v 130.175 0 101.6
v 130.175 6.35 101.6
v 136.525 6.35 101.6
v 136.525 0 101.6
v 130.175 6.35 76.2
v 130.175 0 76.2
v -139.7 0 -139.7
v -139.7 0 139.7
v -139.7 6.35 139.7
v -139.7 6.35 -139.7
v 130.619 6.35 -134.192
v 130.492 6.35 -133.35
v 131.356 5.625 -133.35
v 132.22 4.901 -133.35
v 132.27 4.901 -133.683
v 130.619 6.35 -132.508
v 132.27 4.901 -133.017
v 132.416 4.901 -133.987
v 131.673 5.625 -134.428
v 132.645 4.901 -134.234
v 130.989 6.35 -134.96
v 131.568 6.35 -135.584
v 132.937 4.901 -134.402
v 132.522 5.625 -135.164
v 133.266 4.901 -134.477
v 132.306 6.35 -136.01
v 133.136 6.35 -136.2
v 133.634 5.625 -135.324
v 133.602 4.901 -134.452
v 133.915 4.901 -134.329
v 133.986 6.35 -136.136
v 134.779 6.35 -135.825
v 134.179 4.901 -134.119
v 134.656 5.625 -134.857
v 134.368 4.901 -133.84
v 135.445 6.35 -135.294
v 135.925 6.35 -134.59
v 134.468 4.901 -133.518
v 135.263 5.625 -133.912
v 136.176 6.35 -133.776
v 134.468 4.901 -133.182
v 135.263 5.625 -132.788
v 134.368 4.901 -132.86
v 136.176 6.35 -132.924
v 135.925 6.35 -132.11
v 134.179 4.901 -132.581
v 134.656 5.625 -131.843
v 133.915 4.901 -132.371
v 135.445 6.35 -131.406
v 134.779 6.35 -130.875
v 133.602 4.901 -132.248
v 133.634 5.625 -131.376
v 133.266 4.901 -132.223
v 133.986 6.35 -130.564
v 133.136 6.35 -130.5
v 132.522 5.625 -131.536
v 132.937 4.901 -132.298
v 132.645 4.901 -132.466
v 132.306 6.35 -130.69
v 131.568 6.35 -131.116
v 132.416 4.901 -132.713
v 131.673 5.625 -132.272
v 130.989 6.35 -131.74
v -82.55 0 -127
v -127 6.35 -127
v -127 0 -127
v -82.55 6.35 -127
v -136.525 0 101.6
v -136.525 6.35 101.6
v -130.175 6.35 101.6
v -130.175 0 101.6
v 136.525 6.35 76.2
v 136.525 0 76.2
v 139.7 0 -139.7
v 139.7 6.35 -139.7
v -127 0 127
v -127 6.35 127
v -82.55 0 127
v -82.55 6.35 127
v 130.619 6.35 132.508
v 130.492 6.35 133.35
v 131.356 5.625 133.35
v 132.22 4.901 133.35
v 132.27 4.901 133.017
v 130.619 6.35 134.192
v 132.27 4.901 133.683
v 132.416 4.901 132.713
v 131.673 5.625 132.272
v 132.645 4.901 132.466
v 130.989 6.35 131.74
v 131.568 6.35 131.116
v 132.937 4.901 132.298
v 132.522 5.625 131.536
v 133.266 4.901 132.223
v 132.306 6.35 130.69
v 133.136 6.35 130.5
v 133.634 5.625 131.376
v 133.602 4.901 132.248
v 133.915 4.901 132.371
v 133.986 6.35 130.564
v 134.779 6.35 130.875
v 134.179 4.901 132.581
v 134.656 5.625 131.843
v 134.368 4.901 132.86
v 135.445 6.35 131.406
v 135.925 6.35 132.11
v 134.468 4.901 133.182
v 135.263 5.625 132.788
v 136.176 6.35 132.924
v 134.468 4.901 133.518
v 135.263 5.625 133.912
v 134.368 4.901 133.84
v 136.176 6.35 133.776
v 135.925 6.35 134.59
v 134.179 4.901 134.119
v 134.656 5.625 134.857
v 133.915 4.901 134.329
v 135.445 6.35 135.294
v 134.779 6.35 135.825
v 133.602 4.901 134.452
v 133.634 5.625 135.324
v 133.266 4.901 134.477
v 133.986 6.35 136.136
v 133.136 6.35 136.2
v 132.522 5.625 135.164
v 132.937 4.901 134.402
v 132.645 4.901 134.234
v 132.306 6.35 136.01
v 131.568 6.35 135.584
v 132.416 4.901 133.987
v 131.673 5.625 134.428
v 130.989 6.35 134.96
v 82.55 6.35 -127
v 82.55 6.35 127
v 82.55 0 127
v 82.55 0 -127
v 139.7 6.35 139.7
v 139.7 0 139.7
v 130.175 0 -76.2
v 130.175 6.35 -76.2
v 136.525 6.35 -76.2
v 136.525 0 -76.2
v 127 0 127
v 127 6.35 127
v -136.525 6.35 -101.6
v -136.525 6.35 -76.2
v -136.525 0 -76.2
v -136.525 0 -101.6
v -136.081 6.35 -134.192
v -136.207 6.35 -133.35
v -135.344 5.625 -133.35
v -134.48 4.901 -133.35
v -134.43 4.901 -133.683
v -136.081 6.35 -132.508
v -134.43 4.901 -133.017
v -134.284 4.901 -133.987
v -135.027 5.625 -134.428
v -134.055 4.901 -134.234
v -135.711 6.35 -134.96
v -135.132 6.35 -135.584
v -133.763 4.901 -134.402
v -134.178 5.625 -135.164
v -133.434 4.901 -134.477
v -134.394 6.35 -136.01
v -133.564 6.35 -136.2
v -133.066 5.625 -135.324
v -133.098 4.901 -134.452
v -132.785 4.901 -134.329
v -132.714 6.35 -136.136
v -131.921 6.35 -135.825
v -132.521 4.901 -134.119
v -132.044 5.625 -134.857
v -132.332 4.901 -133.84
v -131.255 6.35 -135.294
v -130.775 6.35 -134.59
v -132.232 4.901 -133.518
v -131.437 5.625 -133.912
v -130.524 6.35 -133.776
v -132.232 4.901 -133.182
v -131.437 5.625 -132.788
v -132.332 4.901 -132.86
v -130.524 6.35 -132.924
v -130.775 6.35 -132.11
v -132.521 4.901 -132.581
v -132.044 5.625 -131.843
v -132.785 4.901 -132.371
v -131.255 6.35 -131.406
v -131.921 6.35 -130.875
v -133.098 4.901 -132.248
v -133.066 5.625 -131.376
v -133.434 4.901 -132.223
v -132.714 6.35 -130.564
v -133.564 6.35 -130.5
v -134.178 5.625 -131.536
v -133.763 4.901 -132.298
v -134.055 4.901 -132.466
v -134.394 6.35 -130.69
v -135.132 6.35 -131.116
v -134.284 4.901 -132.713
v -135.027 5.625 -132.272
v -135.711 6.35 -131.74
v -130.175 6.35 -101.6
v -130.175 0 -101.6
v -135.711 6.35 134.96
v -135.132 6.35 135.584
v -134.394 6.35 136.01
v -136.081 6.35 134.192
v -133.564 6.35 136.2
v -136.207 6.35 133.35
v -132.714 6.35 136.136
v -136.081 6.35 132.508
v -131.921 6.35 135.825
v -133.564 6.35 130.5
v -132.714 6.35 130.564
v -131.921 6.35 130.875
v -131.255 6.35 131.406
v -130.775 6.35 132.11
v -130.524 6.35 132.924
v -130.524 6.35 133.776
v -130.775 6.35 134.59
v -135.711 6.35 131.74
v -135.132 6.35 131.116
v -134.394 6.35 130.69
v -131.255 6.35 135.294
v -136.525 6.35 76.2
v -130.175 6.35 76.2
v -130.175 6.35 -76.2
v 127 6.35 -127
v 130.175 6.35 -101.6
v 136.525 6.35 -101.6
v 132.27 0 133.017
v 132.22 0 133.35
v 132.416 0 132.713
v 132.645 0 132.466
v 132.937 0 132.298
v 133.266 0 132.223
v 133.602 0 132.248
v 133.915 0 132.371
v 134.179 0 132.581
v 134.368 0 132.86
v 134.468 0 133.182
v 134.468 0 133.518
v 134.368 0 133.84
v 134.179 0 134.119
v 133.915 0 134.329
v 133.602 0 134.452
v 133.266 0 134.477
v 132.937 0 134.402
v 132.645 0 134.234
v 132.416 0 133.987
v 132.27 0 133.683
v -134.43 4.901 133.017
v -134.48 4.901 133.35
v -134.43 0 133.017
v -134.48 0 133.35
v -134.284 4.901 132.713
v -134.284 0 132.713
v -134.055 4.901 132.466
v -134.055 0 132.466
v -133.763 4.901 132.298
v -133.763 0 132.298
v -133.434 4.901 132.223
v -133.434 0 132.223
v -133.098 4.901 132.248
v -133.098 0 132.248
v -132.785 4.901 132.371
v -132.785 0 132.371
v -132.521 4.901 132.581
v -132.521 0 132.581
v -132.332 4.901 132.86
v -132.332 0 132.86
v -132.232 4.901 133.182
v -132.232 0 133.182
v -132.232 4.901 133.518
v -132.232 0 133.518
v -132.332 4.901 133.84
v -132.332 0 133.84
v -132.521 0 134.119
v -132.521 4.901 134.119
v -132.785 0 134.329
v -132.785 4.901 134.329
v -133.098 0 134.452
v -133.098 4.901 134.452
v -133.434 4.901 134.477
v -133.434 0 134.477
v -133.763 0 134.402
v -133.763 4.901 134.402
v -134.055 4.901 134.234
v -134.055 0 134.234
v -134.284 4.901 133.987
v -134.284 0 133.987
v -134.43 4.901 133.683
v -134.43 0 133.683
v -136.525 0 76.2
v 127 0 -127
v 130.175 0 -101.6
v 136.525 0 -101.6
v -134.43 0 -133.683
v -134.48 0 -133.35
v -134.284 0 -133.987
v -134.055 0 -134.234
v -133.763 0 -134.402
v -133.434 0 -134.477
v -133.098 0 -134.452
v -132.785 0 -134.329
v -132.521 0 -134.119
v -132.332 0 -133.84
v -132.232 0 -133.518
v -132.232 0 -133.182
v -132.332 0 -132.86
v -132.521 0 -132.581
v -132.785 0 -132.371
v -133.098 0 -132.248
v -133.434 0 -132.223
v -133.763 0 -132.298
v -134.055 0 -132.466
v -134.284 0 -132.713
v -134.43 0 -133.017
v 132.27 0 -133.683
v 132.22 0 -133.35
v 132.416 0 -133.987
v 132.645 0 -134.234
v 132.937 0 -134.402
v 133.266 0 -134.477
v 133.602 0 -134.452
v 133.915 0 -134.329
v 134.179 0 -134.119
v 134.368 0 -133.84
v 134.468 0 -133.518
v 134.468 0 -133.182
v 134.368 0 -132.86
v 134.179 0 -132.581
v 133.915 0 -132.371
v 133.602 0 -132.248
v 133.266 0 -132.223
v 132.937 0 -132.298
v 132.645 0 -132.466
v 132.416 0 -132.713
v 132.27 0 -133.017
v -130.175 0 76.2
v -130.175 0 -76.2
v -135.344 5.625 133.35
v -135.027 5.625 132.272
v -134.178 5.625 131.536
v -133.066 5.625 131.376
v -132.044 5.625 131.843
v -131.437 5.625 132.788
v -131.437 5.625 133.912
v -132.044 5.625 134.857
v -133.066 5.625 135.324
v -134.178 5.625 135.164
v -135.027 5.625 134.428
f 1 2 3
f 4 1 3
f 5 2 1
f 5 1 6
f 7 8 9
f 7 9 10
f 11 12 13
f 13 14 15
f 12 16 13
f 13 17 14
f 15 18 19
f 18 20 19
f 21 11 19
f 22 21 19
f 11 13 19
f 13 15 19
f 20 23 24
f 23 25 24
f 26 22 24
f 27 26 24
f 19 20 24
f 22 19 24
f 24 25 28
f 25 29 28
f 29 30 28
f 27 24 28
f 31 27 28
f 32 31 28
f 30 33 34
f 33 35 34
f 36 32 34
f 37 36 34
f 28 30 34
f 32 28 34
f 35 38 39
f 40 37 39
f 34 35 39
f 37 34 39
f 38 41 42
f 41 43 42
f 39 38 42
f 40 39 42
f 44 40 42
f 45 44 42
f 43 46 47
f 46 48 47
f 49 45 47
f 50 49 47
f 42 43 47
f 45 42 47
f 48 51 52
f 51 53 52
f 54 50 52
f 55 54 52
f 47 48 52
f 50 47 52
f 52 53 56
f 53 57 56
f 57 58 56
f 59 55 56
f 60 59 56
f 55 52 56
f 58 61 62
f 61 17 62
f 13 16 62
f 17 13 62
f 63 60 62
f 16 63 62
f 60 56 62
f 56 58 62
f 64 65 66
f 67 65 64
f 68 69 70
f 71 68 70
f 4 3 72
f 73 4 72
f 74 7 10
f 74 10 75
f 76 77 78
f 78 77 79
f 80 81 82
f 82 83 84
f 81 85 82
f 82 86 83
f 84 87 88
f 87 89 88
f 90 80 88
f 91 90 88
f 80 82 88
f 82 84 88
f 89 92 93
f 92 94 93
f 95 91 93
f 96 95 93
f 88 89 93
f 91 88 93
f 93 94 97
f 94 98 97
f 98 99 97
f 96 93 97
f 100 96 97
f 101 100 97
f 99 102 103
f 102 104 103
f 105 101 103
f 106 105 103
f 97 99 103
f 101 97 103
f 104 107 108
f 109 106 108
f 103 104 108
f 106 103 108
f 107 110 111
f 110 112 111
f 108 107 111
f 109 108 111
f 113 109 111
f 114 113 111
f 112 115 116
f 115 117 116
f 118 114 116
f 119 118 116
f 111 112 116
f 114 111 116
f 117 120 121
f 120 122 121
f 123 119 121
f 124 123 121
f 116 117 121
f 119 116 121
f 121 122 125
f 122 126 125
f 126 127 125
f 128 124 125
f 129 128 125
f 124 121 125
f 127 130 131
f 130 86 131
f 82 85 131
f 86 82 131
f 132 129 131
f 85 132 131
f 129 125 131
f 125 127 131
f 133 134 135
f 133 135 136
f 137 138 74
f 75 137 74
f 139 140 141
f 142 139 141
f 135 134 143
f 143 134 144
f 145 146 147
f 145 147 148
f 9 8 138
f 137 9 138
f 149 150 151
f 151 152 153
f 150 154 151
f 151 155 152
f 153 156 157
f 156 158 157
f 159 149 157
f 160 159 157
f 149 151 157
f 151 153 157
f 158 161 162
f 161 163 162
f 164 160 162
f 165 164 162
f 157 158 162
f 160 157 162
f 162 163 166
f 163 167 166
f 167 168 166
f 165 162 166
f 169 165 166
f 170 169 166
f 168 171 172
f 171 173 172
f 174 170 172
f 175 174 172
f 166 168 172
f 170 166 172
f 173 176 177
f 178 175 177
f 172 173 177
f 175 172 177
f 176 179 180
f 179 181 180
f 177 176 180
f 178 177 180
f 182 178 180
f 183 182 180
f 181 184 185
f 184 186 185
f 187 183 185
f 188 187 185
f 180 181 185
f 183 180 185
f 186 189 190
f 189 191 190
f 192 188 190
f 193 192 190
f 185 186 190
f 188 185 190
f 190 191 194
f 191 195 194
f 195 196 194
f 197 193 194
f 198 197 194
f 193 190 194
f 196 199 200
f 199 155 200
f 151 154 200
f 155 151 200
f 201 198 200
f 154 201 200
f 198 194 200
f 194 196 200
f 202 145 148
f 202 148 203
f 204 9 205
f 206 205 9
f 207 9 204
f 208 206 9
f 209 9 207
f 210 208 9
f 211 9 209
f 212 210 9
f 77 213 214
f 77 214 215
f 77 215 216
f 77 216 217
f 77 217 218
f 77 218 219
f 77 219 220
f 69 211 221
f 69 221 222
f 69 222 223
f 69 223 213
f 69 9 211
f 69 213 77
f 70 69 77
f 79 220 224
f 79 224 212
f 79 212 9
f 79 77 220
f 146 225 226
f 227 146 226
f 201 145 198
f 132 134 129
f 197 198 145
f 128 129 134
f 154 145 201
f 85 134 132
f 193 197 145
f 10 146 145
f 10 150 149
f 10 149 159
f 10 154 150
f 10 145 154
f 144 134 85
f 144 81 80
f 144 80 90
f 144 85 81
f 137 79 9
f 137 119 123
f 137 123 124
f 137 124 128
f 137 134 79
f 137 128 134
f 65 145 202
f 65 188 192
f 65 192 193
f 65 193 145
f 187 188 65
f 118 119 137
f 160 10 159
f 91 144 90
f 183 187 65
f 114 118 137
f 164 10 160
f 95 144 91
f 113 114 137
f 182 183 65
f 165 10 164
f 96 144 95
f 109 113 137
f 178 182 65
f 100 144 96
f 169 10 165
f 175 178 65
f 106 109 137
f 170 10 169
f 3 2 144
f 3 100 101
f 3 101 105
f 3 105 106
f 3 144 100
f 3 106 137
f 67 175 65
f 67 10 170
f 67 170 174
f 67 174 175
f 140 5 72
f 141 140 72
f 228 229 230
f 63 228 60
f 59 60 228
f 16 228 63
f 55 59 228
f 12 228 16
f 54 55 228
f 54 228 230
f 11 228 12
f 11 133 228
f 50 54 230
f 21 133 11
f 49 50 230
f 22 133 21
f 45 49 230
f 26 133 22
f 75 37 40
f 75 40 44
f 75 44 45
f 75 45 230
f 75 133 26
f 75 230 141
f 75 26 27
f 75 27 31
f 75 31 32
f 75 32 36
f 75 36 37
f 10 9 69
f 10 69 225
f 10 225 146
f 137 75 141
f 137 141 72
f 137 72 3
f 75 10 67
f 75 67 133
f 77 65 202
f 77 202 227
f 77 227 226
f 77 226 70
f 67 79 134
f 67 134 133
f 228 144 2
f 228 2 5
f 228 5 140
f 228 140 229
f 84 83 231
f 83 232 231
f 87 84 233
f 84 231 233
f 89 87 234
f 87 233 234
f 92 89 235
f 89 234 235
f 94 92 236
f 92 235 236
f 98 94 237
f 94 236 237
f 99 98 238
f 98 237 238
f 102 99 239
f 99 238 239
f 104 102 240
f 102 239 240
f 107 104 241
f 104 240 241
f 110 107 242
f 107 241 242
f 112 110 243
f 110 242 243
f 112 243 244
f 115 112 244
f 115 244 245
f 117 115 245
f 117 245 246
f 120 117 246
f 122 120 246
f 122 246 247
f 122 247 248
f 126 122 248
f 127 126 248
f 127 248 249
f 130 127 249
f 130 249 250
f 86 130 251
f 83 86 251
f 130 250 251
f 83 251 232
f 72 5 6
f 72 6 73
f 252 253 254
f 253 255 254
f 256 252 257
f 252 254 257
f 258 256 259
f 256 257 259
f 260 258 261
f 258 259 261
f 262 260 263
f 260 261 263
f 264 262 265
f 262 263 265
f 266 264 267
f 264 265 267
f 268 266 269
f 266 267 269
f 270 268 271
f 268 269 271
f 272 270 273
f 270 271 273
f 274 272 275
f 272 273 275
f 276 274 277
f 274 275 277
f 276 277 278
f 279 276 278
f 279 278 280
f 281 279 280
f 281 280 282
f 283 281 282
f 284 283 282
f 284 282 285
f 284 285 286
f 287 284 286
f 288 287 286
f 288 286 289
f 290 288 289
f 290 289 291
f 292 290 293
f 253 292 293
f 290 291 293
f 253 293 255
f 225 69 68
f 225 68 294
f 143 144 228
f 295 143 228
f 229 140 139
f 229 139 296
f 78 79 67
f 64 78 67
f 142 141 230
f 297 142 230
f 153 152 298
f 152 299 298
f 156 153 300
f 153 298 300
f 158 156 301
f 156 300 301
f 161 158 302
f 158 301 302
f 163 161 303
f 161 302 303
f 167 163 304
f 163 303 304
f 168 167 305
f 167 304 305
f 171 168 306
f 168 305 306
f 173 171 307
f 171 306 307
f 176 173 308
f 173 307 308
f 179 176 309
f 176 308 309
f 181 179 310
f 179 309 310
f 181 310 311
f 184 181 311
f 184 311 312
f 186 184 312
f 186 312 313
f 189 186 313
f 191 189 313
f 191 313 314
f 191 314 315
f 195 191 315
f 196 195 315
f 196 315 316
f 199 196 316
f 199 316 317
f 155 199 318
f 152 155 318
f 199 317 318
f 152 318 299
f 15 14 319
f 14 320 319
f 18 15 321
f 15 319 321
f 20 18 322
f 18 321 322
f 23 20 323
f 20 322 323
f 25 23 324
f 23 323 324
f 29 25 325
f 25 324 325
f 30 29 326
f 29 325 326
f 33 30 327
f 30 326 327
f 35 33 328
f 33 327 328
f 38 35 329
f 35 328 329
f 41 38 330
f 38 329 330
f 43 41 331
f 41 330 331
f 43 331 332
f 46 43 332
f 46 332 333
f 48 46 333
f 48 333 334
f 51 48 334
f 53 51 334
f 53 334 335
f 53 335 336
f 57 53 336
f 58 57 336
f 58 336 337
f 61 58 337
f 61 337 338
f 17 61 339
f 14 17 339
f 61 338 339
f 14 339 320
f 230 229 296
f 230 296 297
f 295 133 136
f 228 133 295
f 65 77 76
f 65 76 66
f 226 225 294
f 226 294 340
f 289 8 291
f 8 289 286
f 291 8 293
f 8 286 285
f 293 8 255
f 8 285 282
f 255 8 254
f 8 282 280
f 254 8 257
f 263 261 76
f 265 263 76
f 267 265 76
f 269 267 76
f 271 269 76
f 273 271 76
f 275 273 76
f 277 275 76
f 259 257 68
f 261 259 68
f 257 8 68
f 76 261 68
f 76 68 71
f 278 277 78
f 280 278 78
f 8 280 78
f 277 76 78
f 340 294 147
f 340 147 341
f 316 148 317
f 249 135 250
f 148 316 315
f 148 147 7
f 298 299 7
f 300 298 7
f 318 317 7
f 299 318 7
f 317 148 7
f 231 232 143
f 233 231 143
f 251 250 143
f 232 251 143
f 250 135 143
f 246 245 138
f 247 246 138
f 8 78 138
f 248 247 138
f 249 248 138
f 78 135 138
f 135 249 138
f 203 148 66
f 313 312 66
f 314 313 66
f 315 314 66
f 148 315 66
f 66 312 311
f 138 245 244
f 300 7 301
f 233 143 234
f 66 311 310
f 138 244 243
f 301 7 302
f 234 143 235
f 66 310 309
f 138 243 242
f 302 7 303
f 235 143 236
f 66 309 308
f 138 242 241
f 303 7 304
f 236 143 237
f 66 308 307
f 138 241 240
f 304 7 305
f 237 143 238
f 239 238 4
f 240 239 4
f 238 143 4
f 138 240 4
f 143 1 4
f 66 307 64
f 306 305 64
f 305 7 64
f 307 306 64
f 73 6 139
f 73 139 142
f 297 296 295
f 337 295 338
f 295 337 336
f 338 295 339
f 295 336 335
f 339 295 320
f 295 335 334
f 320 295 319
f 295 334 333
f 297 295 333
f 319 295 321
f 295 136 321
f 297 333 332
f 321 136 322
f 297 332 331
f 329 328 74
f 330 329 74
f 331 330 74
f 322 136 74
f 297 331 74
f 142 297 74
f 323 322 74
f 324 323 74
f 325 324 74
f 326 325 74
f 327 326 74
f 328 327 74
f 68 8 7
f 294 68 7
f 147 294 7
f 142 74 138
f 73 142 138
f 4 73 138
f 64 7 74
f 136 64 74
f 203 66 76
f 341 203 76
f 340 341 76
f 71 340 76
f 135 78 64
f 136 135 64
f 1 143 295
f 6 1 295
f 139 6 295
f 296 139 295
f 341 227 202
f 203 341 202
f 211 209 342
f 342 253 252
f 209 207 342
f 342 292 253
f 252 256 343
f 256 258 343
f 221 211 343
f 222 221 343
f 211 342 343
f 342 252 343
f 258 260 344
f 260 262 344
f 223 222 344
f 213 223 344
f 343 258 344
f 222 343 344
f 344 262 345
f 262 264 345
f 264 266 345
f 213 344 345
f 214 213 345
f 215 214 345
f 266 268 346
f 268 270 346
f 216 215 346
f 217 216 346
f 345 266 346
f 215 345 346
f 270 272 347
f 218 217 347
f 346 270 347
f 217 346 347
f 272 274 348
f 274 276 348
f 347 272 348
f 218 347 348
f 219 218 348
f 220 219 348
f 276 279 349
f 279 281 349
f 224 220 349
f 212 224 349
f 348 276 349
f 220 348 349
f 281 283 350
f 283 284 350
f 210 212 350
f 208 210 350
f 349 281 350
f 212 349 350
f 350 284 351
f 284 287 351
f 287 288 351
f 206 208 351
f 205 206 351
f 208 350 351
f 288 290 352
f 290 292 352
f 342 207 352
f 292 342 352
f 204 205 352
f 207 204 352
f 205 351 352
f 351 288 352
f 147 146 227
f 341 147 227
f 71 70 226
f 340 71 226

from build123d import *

# Parameters (mm, degrees)
SKETCH1_W                       = 279.4
SKETCH1_H                       = 279.4
BOSS_EXTRUDE1_DEPTH             = 6.35
SKETCH2_W                       = 44.45
SKETCH2_H                       = 254
SKETCH2_W_2                     = 6.35
SKETCH2_H_2                     = 25.4
CUT_EXTRUDE1_DEPTH              = 7.35
F_4_40_TAPPED_HOLE1_D           = 2.2606
F_4_40_TAPPED_HOLE1_CSINK_D     = 5.715
F_4_40_TAPPED_HOLE1_CSINK_ANGLE = 100


with BuildPart() as part:
    # Sketch1 → Boss-Extrude1 (new body)
    with BuildSketch(Plane(origin=(0, 0, 0), x_dir=(1, 0, 0), z_dir=(0, 1, 0))):
        Rectangle(SKETCH1_W, SKETCH1_H)
    extrude(amount=BOSS_EXTRUDE1_DEPTH)

    # Sketch2 → Cut-Extrude1 (cut, through all)
    with BuildSketch(Plane(origin=(0, 6.35, 0), x_dir=(1, 0, 0), z_dir=(0, 1, 0))):
        with Locations((-104.775, 0)):
            Rectangle(SKETCH2_W, SKETCH2_H)
        with Locations((104.775, 0)):
            Rectangle(SKETCH2_W, SKETCH2_H)
        with Locations((133.35, 88.9)):
            Rectangle(SKETCH2_W_2, SKETCH2_H_2)
        with Locations((-133.35, 88.9)):
            Rectangle(SKETCH2_W_2, SKETCH2_H_2)
        with Locations((133.35, -88.9)):
            Rectangle(SKETCH2_W_2, SKETCH2_H_2)
        with Locations((-133.35, -88.9)):
            Rectangle(SKETCH2_W_2, SKETCH2_H_2)
    extrude(amount=-CUT_EXTRUDE1_DEPTH, mode=Mode.SUBTRACT)

    # #4-40 Tapped Hole1 (through all)
    with Locations(Plane(origin=(0, 6.35, 0), x_dir=(1, 0, 0), z_dir=(0, 1, 0))):
        with Locations((-133.35, 133.35), (-133.35, -133.35), (133.35, -133.35), (133.35, 133.35)):
            CounterSinkHole(F_4_40_TAPPED_HOLE1_D / 2, F_4_40_TAPPED_HOLE1_CSINK_D / 2, counter_sink_angle=F_4_40_TAPPED_HOLE1_CSINK_ANGLE)


solid = part.part
